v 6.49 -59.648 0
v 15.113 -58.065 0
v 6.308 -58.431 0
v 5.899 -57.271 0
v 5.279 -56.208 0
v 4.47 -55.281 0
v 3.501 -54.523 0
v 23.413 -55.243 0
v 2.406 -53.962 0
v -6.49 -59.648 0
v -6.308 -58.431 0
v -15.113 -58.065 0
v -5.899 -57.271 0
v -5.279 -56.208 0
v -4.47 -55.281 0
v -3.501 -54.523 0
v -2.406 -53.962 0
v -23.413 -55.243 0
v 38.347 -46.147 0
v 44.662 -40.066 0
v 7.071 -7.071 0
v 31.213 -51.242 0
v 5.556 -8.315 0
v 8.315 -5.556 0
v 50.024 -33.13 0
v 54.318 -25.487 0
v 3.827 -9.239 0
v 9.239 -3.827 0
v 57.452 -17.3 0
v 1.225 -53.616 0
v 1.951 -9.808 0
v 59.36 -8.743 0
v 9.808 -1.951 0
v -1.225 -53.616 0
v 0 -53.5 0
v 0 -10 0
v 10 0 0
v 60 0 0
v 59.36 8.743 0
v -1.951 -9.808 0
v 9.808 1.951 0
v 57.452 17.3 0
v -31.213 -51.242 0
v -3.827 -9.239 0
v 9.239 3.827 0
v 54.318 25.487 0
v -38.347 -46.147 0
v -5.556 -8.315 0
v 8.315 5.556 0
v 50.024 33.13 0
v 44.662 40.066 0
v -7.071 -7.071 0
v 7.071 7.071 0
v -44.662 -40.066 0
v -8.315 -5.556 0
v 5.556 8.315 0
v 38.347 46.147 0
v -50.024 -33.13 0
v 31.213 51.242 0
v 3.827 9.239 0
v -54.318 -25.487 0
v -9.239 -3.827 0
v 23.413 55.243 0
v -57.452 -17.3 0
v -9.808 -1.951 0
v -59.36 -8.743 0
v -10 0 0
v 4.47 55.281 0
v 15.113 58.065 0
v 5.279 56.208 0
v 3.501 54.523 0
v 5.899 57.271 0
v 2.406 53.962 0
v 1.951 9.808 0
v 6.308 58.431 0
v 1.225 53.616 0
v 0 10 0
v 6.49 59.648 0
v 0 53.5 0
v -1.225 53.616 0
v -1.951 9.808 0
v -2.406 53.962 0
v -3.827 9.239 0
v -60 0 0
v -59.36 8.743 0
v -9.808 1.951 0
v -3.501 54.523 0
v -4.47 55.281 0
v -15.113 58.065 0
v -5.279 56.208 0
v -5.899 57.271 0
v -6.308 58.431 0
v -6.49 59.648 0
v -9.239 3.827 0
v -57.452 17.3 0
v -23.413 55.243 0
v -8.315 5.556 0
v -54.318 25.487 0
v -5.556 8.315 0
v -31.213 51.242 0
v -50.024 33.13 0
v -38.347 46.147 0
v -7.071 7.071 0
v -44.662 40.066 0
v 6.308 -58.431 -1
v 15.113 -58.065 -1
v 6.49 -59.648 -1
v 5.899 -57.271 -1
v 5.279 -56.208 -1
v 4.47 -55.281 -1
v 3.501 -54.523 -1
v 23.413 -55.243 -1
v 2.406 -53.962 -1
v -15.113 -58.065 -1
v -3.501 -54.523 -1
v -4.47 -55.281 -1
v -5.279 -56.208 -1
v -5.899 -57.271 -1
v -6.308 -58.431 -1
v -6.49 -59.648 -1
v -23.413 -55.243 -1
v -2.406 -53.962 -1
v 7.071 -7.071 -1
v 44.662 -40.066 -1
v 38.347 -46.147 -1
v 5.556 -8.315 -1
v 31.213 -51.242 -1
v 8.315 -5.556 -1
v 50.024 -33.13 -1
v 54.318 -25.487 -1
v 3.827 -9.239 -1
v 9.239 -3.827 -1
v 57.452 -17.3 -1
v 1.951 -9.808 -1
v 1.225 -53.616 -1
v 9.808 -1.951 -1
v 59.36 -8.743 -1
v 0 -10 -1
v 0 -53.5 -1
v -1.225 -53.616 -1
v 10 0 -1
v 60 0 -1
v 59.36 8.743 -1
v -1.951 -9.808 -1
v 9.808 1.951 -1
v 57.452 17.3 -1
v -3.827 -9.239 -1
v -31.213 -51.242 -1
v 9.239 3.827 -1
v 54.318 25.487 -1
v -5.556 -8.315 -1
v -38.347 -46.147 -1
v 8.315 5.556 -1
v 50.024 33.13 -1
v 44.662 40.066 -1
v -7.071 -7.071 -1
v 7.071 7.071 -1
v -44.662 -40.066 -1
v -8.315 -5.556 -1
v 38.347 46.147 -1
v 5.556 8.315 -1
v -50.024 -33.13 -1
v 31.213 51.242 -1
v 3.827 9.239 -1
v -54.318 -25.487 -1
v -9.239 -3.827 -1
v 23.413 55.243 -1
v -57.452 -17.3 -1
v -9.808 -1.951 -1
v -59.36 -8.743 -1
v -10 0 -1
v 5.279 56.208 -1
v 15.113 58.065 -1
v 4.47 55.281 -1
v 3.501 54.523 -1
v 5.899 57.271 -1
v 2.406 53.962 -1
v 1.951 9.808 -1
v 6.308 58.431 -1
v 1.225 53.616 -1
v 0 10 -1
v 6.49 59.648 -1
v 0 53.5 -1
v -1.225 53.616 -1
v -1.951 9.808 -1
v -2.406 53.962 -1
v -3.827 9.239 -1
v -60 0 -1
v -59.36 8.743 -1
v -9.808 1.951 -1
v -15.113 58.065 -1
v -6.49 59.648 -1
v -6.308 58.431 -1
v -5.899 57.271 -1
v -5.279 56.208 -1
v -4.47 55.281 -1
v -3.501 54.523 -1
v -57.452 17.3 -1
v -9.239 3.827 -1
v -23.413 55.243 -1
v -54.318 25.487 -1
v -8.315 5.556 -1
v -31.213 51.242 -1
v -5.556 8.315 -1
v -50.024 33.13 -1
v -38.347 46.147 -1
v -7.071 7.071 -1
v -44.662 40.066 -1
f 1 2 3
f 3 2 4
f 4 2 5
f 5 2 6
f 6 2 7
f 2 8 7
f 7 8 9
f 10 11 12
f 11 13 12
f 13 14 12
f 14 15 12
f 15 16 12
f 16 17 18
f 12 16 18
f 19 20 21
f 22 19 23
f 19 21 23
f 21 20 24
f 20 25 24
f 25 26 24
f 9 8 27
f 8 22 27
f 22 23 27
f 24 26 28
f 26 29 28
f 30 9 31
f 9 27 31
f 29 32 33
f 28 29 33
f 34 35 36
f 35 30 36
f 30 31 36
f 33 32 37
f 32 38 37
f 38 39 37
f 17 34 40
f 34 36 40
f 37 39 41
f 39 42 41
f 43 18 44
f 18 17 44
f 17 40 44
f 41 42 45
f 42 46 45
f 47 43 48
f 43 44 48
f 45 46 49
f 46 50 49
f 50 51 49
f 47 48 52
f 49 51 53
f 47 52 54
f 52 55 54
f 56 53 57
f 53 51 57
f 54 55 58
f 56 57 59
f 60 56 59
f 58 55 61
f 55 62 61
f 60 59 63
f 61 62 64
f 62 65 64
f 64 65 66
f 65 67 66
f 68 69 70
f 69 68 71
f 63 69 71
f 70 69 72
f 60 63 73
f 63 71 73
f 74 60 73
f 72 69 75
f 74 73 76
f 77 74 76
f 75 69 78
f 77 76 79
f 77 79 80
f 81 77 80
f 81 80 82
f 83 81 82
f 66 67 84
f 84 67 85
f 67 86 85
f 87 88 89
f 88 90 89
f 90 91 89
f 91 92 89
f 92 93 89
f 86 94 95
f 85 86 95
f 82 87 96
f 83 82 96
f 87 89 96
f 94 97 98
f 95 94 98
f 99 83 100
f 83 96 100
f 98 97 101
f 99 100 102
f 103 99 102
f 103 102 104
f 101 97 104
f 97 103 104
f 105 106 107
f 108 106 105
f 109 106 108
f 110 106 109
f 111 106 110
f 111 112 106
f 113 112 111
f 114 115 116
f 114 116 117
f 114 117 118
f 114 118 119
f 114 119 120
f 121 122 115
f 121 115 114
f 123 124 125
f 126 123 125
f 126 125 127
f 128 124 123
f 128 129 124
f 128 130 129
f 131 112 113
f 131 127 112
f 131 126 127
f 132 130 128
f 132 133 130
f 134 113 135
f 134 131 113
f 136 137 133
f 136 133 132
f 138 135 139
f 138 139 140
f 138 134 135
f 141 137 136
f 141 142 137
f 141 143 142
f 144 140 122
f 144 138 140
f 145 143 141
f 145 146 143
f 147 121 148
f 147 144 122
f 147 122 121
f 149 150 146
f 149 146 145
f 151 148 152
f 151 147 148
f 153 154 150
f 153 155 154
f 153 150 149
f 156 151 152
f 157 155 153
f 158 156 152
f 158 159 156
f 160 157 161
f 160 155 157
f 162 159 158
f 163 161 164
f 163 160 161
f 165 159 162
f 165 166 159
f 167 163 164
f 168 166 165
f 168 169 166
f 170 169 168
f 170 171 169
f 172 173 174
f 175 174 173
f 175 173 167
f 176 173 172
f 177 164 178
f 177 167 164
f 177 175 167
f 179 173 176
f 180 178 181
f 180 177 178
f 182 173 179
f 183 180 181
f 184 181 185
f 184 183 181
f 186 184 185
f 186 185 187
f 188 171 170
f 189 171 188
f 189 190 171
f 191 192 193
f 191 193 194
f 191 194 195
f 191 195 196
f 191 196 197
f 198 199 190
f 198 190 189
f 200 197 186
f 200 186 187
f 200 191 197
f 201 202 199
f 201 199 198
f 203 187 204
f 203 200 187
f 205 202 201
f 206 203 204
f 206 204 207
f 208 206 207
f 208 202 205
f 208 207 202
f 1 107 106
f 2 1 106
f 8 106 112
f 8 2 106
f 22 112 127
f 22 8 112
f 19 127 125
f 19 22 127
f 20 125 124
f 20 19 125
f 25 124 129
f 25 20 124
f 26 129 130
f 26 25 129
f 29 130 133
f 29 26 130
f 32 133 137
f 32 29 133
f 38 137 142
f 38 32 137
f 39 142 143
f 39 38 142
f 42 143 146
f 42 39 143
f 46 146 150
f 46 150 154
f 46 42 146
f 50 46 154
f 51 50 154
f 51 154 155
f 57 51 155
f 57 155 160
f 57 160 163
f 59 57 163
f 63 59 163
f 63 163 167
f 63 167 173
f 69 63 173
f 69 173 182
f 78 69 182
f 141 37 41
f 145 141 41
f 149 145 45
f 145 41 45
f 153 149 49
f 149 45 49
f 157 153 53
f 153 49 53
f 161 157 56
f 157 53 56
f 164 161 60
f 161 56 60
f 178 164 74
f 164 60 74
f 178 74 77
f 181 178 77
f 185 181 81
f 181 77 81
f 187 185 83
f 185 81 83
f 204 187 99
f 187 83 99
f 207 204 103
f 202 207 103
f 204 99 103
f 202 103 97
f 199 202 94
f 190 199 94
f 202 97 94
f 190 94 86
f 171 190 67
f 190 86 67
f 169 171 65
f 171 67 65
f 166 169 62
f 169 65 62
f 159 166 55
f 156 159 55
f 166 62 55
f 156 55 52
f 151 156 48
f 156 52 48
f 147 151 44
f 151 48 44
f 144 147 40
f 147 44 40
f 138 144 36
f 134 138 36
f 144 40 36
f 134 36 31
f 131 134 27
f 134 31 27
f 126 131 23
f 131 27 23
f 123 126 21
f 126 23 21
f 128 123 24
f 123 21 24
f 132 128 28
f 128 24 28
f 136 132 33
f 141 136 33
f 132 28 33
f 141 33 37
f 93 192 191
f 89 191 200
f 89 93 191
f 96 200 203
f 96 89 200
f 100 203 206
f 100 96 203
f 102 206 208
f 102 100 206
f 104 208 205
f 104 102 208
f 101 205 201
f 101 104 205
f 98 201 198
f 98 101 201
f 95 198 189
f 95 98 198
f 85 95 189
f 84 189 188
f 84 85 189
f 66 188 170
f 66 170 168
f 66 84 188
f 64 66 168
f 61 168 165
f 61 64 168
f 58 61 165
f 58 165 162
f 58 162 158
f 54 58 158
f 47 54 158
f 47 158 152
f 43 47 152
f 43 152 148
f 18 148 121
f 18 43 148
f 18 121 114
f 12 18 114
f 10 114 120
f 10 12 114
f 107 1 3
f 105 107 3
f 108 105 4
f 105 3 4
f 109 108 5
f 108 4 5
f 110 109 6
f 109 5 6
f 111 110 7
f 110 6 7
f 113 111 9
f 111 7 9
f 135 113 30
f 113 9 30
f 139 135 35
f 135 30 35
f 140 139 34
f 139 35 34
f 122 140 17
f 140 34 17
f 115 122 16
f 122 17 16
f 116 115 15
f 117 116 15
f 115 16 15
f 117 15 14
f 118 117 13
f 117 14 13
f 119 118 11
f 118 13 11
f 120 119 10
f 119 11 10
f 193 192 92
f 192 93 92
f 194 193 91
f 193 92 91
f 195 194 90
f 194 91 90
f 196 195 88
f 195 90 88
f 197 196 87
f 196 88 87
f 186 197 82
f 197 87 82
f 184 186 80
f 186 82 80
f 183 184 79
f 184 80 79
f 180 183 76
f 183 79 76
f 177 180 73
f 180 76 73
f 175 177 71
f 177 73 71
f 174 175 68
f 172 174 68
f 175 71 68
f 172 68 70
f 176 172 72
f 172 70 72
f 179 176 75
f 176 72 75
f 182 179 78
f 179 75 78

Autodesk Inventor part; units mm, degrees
ref_plane "YZ Plane" through (0, 0, 0) normal (1, 0, 0) x (0, 1, 0)
ref_plane "XZ Plane" through (0, 0, 0) normal (0, 1, 0) x (-1, 0, 0)
ref_plane "XY Plane" through (0, 0, 0) normal (0, 0, 1) x (1, 0, 0)
sketch "草圖1" plane through (0, 0, 0) normal (0, 0, 1) x (1, 0, 0)
  circle A0 centre (0, 0) radius 10
  dimension "d0" = 20
extrude "擠出1" add sketch "草圖1" along normal blind 17
sketch "草圖2" plane through (0, 0, 0) normal (0, 0, -1) x (-1, 0, 0)
  circle A0 centre (0, 0) radius 10 projected
  circle A1 centre (0, 0) radius 60
  line L0 (0, 0) -> (0, 60)
  circle A2 centre (0, 60) radius 6.5
  dimension "d3" = 120
  dimension "d4" = 13
extrude "擠出2" add sketch "草圖2" along normal blind 1 contours A0 | A2 A1 | A2 A1 L0 | L0 A1 A2 picked at (-11.4207, 38.8636)
extrude "擠出3" cut sketch "草圖2" along normal blind 1 contours A2 A1 L0 | L0 A1 A2 | A1 A2 picked at (1.4483, 62.0284)
pattern_circular "環形陣列1" count 2 over 360 about axis through (0, 0, 0) along (0, 0, -1) of "擠出3"
sketch "草圖3" plane through (0, 0, 17) normal (0, 0, 1) x (1, 0, 0)
  circle A0 centre (0, 0) radius 10 projected
extrude "擠出4" cut sketch "草圖3" against normal blind 65
